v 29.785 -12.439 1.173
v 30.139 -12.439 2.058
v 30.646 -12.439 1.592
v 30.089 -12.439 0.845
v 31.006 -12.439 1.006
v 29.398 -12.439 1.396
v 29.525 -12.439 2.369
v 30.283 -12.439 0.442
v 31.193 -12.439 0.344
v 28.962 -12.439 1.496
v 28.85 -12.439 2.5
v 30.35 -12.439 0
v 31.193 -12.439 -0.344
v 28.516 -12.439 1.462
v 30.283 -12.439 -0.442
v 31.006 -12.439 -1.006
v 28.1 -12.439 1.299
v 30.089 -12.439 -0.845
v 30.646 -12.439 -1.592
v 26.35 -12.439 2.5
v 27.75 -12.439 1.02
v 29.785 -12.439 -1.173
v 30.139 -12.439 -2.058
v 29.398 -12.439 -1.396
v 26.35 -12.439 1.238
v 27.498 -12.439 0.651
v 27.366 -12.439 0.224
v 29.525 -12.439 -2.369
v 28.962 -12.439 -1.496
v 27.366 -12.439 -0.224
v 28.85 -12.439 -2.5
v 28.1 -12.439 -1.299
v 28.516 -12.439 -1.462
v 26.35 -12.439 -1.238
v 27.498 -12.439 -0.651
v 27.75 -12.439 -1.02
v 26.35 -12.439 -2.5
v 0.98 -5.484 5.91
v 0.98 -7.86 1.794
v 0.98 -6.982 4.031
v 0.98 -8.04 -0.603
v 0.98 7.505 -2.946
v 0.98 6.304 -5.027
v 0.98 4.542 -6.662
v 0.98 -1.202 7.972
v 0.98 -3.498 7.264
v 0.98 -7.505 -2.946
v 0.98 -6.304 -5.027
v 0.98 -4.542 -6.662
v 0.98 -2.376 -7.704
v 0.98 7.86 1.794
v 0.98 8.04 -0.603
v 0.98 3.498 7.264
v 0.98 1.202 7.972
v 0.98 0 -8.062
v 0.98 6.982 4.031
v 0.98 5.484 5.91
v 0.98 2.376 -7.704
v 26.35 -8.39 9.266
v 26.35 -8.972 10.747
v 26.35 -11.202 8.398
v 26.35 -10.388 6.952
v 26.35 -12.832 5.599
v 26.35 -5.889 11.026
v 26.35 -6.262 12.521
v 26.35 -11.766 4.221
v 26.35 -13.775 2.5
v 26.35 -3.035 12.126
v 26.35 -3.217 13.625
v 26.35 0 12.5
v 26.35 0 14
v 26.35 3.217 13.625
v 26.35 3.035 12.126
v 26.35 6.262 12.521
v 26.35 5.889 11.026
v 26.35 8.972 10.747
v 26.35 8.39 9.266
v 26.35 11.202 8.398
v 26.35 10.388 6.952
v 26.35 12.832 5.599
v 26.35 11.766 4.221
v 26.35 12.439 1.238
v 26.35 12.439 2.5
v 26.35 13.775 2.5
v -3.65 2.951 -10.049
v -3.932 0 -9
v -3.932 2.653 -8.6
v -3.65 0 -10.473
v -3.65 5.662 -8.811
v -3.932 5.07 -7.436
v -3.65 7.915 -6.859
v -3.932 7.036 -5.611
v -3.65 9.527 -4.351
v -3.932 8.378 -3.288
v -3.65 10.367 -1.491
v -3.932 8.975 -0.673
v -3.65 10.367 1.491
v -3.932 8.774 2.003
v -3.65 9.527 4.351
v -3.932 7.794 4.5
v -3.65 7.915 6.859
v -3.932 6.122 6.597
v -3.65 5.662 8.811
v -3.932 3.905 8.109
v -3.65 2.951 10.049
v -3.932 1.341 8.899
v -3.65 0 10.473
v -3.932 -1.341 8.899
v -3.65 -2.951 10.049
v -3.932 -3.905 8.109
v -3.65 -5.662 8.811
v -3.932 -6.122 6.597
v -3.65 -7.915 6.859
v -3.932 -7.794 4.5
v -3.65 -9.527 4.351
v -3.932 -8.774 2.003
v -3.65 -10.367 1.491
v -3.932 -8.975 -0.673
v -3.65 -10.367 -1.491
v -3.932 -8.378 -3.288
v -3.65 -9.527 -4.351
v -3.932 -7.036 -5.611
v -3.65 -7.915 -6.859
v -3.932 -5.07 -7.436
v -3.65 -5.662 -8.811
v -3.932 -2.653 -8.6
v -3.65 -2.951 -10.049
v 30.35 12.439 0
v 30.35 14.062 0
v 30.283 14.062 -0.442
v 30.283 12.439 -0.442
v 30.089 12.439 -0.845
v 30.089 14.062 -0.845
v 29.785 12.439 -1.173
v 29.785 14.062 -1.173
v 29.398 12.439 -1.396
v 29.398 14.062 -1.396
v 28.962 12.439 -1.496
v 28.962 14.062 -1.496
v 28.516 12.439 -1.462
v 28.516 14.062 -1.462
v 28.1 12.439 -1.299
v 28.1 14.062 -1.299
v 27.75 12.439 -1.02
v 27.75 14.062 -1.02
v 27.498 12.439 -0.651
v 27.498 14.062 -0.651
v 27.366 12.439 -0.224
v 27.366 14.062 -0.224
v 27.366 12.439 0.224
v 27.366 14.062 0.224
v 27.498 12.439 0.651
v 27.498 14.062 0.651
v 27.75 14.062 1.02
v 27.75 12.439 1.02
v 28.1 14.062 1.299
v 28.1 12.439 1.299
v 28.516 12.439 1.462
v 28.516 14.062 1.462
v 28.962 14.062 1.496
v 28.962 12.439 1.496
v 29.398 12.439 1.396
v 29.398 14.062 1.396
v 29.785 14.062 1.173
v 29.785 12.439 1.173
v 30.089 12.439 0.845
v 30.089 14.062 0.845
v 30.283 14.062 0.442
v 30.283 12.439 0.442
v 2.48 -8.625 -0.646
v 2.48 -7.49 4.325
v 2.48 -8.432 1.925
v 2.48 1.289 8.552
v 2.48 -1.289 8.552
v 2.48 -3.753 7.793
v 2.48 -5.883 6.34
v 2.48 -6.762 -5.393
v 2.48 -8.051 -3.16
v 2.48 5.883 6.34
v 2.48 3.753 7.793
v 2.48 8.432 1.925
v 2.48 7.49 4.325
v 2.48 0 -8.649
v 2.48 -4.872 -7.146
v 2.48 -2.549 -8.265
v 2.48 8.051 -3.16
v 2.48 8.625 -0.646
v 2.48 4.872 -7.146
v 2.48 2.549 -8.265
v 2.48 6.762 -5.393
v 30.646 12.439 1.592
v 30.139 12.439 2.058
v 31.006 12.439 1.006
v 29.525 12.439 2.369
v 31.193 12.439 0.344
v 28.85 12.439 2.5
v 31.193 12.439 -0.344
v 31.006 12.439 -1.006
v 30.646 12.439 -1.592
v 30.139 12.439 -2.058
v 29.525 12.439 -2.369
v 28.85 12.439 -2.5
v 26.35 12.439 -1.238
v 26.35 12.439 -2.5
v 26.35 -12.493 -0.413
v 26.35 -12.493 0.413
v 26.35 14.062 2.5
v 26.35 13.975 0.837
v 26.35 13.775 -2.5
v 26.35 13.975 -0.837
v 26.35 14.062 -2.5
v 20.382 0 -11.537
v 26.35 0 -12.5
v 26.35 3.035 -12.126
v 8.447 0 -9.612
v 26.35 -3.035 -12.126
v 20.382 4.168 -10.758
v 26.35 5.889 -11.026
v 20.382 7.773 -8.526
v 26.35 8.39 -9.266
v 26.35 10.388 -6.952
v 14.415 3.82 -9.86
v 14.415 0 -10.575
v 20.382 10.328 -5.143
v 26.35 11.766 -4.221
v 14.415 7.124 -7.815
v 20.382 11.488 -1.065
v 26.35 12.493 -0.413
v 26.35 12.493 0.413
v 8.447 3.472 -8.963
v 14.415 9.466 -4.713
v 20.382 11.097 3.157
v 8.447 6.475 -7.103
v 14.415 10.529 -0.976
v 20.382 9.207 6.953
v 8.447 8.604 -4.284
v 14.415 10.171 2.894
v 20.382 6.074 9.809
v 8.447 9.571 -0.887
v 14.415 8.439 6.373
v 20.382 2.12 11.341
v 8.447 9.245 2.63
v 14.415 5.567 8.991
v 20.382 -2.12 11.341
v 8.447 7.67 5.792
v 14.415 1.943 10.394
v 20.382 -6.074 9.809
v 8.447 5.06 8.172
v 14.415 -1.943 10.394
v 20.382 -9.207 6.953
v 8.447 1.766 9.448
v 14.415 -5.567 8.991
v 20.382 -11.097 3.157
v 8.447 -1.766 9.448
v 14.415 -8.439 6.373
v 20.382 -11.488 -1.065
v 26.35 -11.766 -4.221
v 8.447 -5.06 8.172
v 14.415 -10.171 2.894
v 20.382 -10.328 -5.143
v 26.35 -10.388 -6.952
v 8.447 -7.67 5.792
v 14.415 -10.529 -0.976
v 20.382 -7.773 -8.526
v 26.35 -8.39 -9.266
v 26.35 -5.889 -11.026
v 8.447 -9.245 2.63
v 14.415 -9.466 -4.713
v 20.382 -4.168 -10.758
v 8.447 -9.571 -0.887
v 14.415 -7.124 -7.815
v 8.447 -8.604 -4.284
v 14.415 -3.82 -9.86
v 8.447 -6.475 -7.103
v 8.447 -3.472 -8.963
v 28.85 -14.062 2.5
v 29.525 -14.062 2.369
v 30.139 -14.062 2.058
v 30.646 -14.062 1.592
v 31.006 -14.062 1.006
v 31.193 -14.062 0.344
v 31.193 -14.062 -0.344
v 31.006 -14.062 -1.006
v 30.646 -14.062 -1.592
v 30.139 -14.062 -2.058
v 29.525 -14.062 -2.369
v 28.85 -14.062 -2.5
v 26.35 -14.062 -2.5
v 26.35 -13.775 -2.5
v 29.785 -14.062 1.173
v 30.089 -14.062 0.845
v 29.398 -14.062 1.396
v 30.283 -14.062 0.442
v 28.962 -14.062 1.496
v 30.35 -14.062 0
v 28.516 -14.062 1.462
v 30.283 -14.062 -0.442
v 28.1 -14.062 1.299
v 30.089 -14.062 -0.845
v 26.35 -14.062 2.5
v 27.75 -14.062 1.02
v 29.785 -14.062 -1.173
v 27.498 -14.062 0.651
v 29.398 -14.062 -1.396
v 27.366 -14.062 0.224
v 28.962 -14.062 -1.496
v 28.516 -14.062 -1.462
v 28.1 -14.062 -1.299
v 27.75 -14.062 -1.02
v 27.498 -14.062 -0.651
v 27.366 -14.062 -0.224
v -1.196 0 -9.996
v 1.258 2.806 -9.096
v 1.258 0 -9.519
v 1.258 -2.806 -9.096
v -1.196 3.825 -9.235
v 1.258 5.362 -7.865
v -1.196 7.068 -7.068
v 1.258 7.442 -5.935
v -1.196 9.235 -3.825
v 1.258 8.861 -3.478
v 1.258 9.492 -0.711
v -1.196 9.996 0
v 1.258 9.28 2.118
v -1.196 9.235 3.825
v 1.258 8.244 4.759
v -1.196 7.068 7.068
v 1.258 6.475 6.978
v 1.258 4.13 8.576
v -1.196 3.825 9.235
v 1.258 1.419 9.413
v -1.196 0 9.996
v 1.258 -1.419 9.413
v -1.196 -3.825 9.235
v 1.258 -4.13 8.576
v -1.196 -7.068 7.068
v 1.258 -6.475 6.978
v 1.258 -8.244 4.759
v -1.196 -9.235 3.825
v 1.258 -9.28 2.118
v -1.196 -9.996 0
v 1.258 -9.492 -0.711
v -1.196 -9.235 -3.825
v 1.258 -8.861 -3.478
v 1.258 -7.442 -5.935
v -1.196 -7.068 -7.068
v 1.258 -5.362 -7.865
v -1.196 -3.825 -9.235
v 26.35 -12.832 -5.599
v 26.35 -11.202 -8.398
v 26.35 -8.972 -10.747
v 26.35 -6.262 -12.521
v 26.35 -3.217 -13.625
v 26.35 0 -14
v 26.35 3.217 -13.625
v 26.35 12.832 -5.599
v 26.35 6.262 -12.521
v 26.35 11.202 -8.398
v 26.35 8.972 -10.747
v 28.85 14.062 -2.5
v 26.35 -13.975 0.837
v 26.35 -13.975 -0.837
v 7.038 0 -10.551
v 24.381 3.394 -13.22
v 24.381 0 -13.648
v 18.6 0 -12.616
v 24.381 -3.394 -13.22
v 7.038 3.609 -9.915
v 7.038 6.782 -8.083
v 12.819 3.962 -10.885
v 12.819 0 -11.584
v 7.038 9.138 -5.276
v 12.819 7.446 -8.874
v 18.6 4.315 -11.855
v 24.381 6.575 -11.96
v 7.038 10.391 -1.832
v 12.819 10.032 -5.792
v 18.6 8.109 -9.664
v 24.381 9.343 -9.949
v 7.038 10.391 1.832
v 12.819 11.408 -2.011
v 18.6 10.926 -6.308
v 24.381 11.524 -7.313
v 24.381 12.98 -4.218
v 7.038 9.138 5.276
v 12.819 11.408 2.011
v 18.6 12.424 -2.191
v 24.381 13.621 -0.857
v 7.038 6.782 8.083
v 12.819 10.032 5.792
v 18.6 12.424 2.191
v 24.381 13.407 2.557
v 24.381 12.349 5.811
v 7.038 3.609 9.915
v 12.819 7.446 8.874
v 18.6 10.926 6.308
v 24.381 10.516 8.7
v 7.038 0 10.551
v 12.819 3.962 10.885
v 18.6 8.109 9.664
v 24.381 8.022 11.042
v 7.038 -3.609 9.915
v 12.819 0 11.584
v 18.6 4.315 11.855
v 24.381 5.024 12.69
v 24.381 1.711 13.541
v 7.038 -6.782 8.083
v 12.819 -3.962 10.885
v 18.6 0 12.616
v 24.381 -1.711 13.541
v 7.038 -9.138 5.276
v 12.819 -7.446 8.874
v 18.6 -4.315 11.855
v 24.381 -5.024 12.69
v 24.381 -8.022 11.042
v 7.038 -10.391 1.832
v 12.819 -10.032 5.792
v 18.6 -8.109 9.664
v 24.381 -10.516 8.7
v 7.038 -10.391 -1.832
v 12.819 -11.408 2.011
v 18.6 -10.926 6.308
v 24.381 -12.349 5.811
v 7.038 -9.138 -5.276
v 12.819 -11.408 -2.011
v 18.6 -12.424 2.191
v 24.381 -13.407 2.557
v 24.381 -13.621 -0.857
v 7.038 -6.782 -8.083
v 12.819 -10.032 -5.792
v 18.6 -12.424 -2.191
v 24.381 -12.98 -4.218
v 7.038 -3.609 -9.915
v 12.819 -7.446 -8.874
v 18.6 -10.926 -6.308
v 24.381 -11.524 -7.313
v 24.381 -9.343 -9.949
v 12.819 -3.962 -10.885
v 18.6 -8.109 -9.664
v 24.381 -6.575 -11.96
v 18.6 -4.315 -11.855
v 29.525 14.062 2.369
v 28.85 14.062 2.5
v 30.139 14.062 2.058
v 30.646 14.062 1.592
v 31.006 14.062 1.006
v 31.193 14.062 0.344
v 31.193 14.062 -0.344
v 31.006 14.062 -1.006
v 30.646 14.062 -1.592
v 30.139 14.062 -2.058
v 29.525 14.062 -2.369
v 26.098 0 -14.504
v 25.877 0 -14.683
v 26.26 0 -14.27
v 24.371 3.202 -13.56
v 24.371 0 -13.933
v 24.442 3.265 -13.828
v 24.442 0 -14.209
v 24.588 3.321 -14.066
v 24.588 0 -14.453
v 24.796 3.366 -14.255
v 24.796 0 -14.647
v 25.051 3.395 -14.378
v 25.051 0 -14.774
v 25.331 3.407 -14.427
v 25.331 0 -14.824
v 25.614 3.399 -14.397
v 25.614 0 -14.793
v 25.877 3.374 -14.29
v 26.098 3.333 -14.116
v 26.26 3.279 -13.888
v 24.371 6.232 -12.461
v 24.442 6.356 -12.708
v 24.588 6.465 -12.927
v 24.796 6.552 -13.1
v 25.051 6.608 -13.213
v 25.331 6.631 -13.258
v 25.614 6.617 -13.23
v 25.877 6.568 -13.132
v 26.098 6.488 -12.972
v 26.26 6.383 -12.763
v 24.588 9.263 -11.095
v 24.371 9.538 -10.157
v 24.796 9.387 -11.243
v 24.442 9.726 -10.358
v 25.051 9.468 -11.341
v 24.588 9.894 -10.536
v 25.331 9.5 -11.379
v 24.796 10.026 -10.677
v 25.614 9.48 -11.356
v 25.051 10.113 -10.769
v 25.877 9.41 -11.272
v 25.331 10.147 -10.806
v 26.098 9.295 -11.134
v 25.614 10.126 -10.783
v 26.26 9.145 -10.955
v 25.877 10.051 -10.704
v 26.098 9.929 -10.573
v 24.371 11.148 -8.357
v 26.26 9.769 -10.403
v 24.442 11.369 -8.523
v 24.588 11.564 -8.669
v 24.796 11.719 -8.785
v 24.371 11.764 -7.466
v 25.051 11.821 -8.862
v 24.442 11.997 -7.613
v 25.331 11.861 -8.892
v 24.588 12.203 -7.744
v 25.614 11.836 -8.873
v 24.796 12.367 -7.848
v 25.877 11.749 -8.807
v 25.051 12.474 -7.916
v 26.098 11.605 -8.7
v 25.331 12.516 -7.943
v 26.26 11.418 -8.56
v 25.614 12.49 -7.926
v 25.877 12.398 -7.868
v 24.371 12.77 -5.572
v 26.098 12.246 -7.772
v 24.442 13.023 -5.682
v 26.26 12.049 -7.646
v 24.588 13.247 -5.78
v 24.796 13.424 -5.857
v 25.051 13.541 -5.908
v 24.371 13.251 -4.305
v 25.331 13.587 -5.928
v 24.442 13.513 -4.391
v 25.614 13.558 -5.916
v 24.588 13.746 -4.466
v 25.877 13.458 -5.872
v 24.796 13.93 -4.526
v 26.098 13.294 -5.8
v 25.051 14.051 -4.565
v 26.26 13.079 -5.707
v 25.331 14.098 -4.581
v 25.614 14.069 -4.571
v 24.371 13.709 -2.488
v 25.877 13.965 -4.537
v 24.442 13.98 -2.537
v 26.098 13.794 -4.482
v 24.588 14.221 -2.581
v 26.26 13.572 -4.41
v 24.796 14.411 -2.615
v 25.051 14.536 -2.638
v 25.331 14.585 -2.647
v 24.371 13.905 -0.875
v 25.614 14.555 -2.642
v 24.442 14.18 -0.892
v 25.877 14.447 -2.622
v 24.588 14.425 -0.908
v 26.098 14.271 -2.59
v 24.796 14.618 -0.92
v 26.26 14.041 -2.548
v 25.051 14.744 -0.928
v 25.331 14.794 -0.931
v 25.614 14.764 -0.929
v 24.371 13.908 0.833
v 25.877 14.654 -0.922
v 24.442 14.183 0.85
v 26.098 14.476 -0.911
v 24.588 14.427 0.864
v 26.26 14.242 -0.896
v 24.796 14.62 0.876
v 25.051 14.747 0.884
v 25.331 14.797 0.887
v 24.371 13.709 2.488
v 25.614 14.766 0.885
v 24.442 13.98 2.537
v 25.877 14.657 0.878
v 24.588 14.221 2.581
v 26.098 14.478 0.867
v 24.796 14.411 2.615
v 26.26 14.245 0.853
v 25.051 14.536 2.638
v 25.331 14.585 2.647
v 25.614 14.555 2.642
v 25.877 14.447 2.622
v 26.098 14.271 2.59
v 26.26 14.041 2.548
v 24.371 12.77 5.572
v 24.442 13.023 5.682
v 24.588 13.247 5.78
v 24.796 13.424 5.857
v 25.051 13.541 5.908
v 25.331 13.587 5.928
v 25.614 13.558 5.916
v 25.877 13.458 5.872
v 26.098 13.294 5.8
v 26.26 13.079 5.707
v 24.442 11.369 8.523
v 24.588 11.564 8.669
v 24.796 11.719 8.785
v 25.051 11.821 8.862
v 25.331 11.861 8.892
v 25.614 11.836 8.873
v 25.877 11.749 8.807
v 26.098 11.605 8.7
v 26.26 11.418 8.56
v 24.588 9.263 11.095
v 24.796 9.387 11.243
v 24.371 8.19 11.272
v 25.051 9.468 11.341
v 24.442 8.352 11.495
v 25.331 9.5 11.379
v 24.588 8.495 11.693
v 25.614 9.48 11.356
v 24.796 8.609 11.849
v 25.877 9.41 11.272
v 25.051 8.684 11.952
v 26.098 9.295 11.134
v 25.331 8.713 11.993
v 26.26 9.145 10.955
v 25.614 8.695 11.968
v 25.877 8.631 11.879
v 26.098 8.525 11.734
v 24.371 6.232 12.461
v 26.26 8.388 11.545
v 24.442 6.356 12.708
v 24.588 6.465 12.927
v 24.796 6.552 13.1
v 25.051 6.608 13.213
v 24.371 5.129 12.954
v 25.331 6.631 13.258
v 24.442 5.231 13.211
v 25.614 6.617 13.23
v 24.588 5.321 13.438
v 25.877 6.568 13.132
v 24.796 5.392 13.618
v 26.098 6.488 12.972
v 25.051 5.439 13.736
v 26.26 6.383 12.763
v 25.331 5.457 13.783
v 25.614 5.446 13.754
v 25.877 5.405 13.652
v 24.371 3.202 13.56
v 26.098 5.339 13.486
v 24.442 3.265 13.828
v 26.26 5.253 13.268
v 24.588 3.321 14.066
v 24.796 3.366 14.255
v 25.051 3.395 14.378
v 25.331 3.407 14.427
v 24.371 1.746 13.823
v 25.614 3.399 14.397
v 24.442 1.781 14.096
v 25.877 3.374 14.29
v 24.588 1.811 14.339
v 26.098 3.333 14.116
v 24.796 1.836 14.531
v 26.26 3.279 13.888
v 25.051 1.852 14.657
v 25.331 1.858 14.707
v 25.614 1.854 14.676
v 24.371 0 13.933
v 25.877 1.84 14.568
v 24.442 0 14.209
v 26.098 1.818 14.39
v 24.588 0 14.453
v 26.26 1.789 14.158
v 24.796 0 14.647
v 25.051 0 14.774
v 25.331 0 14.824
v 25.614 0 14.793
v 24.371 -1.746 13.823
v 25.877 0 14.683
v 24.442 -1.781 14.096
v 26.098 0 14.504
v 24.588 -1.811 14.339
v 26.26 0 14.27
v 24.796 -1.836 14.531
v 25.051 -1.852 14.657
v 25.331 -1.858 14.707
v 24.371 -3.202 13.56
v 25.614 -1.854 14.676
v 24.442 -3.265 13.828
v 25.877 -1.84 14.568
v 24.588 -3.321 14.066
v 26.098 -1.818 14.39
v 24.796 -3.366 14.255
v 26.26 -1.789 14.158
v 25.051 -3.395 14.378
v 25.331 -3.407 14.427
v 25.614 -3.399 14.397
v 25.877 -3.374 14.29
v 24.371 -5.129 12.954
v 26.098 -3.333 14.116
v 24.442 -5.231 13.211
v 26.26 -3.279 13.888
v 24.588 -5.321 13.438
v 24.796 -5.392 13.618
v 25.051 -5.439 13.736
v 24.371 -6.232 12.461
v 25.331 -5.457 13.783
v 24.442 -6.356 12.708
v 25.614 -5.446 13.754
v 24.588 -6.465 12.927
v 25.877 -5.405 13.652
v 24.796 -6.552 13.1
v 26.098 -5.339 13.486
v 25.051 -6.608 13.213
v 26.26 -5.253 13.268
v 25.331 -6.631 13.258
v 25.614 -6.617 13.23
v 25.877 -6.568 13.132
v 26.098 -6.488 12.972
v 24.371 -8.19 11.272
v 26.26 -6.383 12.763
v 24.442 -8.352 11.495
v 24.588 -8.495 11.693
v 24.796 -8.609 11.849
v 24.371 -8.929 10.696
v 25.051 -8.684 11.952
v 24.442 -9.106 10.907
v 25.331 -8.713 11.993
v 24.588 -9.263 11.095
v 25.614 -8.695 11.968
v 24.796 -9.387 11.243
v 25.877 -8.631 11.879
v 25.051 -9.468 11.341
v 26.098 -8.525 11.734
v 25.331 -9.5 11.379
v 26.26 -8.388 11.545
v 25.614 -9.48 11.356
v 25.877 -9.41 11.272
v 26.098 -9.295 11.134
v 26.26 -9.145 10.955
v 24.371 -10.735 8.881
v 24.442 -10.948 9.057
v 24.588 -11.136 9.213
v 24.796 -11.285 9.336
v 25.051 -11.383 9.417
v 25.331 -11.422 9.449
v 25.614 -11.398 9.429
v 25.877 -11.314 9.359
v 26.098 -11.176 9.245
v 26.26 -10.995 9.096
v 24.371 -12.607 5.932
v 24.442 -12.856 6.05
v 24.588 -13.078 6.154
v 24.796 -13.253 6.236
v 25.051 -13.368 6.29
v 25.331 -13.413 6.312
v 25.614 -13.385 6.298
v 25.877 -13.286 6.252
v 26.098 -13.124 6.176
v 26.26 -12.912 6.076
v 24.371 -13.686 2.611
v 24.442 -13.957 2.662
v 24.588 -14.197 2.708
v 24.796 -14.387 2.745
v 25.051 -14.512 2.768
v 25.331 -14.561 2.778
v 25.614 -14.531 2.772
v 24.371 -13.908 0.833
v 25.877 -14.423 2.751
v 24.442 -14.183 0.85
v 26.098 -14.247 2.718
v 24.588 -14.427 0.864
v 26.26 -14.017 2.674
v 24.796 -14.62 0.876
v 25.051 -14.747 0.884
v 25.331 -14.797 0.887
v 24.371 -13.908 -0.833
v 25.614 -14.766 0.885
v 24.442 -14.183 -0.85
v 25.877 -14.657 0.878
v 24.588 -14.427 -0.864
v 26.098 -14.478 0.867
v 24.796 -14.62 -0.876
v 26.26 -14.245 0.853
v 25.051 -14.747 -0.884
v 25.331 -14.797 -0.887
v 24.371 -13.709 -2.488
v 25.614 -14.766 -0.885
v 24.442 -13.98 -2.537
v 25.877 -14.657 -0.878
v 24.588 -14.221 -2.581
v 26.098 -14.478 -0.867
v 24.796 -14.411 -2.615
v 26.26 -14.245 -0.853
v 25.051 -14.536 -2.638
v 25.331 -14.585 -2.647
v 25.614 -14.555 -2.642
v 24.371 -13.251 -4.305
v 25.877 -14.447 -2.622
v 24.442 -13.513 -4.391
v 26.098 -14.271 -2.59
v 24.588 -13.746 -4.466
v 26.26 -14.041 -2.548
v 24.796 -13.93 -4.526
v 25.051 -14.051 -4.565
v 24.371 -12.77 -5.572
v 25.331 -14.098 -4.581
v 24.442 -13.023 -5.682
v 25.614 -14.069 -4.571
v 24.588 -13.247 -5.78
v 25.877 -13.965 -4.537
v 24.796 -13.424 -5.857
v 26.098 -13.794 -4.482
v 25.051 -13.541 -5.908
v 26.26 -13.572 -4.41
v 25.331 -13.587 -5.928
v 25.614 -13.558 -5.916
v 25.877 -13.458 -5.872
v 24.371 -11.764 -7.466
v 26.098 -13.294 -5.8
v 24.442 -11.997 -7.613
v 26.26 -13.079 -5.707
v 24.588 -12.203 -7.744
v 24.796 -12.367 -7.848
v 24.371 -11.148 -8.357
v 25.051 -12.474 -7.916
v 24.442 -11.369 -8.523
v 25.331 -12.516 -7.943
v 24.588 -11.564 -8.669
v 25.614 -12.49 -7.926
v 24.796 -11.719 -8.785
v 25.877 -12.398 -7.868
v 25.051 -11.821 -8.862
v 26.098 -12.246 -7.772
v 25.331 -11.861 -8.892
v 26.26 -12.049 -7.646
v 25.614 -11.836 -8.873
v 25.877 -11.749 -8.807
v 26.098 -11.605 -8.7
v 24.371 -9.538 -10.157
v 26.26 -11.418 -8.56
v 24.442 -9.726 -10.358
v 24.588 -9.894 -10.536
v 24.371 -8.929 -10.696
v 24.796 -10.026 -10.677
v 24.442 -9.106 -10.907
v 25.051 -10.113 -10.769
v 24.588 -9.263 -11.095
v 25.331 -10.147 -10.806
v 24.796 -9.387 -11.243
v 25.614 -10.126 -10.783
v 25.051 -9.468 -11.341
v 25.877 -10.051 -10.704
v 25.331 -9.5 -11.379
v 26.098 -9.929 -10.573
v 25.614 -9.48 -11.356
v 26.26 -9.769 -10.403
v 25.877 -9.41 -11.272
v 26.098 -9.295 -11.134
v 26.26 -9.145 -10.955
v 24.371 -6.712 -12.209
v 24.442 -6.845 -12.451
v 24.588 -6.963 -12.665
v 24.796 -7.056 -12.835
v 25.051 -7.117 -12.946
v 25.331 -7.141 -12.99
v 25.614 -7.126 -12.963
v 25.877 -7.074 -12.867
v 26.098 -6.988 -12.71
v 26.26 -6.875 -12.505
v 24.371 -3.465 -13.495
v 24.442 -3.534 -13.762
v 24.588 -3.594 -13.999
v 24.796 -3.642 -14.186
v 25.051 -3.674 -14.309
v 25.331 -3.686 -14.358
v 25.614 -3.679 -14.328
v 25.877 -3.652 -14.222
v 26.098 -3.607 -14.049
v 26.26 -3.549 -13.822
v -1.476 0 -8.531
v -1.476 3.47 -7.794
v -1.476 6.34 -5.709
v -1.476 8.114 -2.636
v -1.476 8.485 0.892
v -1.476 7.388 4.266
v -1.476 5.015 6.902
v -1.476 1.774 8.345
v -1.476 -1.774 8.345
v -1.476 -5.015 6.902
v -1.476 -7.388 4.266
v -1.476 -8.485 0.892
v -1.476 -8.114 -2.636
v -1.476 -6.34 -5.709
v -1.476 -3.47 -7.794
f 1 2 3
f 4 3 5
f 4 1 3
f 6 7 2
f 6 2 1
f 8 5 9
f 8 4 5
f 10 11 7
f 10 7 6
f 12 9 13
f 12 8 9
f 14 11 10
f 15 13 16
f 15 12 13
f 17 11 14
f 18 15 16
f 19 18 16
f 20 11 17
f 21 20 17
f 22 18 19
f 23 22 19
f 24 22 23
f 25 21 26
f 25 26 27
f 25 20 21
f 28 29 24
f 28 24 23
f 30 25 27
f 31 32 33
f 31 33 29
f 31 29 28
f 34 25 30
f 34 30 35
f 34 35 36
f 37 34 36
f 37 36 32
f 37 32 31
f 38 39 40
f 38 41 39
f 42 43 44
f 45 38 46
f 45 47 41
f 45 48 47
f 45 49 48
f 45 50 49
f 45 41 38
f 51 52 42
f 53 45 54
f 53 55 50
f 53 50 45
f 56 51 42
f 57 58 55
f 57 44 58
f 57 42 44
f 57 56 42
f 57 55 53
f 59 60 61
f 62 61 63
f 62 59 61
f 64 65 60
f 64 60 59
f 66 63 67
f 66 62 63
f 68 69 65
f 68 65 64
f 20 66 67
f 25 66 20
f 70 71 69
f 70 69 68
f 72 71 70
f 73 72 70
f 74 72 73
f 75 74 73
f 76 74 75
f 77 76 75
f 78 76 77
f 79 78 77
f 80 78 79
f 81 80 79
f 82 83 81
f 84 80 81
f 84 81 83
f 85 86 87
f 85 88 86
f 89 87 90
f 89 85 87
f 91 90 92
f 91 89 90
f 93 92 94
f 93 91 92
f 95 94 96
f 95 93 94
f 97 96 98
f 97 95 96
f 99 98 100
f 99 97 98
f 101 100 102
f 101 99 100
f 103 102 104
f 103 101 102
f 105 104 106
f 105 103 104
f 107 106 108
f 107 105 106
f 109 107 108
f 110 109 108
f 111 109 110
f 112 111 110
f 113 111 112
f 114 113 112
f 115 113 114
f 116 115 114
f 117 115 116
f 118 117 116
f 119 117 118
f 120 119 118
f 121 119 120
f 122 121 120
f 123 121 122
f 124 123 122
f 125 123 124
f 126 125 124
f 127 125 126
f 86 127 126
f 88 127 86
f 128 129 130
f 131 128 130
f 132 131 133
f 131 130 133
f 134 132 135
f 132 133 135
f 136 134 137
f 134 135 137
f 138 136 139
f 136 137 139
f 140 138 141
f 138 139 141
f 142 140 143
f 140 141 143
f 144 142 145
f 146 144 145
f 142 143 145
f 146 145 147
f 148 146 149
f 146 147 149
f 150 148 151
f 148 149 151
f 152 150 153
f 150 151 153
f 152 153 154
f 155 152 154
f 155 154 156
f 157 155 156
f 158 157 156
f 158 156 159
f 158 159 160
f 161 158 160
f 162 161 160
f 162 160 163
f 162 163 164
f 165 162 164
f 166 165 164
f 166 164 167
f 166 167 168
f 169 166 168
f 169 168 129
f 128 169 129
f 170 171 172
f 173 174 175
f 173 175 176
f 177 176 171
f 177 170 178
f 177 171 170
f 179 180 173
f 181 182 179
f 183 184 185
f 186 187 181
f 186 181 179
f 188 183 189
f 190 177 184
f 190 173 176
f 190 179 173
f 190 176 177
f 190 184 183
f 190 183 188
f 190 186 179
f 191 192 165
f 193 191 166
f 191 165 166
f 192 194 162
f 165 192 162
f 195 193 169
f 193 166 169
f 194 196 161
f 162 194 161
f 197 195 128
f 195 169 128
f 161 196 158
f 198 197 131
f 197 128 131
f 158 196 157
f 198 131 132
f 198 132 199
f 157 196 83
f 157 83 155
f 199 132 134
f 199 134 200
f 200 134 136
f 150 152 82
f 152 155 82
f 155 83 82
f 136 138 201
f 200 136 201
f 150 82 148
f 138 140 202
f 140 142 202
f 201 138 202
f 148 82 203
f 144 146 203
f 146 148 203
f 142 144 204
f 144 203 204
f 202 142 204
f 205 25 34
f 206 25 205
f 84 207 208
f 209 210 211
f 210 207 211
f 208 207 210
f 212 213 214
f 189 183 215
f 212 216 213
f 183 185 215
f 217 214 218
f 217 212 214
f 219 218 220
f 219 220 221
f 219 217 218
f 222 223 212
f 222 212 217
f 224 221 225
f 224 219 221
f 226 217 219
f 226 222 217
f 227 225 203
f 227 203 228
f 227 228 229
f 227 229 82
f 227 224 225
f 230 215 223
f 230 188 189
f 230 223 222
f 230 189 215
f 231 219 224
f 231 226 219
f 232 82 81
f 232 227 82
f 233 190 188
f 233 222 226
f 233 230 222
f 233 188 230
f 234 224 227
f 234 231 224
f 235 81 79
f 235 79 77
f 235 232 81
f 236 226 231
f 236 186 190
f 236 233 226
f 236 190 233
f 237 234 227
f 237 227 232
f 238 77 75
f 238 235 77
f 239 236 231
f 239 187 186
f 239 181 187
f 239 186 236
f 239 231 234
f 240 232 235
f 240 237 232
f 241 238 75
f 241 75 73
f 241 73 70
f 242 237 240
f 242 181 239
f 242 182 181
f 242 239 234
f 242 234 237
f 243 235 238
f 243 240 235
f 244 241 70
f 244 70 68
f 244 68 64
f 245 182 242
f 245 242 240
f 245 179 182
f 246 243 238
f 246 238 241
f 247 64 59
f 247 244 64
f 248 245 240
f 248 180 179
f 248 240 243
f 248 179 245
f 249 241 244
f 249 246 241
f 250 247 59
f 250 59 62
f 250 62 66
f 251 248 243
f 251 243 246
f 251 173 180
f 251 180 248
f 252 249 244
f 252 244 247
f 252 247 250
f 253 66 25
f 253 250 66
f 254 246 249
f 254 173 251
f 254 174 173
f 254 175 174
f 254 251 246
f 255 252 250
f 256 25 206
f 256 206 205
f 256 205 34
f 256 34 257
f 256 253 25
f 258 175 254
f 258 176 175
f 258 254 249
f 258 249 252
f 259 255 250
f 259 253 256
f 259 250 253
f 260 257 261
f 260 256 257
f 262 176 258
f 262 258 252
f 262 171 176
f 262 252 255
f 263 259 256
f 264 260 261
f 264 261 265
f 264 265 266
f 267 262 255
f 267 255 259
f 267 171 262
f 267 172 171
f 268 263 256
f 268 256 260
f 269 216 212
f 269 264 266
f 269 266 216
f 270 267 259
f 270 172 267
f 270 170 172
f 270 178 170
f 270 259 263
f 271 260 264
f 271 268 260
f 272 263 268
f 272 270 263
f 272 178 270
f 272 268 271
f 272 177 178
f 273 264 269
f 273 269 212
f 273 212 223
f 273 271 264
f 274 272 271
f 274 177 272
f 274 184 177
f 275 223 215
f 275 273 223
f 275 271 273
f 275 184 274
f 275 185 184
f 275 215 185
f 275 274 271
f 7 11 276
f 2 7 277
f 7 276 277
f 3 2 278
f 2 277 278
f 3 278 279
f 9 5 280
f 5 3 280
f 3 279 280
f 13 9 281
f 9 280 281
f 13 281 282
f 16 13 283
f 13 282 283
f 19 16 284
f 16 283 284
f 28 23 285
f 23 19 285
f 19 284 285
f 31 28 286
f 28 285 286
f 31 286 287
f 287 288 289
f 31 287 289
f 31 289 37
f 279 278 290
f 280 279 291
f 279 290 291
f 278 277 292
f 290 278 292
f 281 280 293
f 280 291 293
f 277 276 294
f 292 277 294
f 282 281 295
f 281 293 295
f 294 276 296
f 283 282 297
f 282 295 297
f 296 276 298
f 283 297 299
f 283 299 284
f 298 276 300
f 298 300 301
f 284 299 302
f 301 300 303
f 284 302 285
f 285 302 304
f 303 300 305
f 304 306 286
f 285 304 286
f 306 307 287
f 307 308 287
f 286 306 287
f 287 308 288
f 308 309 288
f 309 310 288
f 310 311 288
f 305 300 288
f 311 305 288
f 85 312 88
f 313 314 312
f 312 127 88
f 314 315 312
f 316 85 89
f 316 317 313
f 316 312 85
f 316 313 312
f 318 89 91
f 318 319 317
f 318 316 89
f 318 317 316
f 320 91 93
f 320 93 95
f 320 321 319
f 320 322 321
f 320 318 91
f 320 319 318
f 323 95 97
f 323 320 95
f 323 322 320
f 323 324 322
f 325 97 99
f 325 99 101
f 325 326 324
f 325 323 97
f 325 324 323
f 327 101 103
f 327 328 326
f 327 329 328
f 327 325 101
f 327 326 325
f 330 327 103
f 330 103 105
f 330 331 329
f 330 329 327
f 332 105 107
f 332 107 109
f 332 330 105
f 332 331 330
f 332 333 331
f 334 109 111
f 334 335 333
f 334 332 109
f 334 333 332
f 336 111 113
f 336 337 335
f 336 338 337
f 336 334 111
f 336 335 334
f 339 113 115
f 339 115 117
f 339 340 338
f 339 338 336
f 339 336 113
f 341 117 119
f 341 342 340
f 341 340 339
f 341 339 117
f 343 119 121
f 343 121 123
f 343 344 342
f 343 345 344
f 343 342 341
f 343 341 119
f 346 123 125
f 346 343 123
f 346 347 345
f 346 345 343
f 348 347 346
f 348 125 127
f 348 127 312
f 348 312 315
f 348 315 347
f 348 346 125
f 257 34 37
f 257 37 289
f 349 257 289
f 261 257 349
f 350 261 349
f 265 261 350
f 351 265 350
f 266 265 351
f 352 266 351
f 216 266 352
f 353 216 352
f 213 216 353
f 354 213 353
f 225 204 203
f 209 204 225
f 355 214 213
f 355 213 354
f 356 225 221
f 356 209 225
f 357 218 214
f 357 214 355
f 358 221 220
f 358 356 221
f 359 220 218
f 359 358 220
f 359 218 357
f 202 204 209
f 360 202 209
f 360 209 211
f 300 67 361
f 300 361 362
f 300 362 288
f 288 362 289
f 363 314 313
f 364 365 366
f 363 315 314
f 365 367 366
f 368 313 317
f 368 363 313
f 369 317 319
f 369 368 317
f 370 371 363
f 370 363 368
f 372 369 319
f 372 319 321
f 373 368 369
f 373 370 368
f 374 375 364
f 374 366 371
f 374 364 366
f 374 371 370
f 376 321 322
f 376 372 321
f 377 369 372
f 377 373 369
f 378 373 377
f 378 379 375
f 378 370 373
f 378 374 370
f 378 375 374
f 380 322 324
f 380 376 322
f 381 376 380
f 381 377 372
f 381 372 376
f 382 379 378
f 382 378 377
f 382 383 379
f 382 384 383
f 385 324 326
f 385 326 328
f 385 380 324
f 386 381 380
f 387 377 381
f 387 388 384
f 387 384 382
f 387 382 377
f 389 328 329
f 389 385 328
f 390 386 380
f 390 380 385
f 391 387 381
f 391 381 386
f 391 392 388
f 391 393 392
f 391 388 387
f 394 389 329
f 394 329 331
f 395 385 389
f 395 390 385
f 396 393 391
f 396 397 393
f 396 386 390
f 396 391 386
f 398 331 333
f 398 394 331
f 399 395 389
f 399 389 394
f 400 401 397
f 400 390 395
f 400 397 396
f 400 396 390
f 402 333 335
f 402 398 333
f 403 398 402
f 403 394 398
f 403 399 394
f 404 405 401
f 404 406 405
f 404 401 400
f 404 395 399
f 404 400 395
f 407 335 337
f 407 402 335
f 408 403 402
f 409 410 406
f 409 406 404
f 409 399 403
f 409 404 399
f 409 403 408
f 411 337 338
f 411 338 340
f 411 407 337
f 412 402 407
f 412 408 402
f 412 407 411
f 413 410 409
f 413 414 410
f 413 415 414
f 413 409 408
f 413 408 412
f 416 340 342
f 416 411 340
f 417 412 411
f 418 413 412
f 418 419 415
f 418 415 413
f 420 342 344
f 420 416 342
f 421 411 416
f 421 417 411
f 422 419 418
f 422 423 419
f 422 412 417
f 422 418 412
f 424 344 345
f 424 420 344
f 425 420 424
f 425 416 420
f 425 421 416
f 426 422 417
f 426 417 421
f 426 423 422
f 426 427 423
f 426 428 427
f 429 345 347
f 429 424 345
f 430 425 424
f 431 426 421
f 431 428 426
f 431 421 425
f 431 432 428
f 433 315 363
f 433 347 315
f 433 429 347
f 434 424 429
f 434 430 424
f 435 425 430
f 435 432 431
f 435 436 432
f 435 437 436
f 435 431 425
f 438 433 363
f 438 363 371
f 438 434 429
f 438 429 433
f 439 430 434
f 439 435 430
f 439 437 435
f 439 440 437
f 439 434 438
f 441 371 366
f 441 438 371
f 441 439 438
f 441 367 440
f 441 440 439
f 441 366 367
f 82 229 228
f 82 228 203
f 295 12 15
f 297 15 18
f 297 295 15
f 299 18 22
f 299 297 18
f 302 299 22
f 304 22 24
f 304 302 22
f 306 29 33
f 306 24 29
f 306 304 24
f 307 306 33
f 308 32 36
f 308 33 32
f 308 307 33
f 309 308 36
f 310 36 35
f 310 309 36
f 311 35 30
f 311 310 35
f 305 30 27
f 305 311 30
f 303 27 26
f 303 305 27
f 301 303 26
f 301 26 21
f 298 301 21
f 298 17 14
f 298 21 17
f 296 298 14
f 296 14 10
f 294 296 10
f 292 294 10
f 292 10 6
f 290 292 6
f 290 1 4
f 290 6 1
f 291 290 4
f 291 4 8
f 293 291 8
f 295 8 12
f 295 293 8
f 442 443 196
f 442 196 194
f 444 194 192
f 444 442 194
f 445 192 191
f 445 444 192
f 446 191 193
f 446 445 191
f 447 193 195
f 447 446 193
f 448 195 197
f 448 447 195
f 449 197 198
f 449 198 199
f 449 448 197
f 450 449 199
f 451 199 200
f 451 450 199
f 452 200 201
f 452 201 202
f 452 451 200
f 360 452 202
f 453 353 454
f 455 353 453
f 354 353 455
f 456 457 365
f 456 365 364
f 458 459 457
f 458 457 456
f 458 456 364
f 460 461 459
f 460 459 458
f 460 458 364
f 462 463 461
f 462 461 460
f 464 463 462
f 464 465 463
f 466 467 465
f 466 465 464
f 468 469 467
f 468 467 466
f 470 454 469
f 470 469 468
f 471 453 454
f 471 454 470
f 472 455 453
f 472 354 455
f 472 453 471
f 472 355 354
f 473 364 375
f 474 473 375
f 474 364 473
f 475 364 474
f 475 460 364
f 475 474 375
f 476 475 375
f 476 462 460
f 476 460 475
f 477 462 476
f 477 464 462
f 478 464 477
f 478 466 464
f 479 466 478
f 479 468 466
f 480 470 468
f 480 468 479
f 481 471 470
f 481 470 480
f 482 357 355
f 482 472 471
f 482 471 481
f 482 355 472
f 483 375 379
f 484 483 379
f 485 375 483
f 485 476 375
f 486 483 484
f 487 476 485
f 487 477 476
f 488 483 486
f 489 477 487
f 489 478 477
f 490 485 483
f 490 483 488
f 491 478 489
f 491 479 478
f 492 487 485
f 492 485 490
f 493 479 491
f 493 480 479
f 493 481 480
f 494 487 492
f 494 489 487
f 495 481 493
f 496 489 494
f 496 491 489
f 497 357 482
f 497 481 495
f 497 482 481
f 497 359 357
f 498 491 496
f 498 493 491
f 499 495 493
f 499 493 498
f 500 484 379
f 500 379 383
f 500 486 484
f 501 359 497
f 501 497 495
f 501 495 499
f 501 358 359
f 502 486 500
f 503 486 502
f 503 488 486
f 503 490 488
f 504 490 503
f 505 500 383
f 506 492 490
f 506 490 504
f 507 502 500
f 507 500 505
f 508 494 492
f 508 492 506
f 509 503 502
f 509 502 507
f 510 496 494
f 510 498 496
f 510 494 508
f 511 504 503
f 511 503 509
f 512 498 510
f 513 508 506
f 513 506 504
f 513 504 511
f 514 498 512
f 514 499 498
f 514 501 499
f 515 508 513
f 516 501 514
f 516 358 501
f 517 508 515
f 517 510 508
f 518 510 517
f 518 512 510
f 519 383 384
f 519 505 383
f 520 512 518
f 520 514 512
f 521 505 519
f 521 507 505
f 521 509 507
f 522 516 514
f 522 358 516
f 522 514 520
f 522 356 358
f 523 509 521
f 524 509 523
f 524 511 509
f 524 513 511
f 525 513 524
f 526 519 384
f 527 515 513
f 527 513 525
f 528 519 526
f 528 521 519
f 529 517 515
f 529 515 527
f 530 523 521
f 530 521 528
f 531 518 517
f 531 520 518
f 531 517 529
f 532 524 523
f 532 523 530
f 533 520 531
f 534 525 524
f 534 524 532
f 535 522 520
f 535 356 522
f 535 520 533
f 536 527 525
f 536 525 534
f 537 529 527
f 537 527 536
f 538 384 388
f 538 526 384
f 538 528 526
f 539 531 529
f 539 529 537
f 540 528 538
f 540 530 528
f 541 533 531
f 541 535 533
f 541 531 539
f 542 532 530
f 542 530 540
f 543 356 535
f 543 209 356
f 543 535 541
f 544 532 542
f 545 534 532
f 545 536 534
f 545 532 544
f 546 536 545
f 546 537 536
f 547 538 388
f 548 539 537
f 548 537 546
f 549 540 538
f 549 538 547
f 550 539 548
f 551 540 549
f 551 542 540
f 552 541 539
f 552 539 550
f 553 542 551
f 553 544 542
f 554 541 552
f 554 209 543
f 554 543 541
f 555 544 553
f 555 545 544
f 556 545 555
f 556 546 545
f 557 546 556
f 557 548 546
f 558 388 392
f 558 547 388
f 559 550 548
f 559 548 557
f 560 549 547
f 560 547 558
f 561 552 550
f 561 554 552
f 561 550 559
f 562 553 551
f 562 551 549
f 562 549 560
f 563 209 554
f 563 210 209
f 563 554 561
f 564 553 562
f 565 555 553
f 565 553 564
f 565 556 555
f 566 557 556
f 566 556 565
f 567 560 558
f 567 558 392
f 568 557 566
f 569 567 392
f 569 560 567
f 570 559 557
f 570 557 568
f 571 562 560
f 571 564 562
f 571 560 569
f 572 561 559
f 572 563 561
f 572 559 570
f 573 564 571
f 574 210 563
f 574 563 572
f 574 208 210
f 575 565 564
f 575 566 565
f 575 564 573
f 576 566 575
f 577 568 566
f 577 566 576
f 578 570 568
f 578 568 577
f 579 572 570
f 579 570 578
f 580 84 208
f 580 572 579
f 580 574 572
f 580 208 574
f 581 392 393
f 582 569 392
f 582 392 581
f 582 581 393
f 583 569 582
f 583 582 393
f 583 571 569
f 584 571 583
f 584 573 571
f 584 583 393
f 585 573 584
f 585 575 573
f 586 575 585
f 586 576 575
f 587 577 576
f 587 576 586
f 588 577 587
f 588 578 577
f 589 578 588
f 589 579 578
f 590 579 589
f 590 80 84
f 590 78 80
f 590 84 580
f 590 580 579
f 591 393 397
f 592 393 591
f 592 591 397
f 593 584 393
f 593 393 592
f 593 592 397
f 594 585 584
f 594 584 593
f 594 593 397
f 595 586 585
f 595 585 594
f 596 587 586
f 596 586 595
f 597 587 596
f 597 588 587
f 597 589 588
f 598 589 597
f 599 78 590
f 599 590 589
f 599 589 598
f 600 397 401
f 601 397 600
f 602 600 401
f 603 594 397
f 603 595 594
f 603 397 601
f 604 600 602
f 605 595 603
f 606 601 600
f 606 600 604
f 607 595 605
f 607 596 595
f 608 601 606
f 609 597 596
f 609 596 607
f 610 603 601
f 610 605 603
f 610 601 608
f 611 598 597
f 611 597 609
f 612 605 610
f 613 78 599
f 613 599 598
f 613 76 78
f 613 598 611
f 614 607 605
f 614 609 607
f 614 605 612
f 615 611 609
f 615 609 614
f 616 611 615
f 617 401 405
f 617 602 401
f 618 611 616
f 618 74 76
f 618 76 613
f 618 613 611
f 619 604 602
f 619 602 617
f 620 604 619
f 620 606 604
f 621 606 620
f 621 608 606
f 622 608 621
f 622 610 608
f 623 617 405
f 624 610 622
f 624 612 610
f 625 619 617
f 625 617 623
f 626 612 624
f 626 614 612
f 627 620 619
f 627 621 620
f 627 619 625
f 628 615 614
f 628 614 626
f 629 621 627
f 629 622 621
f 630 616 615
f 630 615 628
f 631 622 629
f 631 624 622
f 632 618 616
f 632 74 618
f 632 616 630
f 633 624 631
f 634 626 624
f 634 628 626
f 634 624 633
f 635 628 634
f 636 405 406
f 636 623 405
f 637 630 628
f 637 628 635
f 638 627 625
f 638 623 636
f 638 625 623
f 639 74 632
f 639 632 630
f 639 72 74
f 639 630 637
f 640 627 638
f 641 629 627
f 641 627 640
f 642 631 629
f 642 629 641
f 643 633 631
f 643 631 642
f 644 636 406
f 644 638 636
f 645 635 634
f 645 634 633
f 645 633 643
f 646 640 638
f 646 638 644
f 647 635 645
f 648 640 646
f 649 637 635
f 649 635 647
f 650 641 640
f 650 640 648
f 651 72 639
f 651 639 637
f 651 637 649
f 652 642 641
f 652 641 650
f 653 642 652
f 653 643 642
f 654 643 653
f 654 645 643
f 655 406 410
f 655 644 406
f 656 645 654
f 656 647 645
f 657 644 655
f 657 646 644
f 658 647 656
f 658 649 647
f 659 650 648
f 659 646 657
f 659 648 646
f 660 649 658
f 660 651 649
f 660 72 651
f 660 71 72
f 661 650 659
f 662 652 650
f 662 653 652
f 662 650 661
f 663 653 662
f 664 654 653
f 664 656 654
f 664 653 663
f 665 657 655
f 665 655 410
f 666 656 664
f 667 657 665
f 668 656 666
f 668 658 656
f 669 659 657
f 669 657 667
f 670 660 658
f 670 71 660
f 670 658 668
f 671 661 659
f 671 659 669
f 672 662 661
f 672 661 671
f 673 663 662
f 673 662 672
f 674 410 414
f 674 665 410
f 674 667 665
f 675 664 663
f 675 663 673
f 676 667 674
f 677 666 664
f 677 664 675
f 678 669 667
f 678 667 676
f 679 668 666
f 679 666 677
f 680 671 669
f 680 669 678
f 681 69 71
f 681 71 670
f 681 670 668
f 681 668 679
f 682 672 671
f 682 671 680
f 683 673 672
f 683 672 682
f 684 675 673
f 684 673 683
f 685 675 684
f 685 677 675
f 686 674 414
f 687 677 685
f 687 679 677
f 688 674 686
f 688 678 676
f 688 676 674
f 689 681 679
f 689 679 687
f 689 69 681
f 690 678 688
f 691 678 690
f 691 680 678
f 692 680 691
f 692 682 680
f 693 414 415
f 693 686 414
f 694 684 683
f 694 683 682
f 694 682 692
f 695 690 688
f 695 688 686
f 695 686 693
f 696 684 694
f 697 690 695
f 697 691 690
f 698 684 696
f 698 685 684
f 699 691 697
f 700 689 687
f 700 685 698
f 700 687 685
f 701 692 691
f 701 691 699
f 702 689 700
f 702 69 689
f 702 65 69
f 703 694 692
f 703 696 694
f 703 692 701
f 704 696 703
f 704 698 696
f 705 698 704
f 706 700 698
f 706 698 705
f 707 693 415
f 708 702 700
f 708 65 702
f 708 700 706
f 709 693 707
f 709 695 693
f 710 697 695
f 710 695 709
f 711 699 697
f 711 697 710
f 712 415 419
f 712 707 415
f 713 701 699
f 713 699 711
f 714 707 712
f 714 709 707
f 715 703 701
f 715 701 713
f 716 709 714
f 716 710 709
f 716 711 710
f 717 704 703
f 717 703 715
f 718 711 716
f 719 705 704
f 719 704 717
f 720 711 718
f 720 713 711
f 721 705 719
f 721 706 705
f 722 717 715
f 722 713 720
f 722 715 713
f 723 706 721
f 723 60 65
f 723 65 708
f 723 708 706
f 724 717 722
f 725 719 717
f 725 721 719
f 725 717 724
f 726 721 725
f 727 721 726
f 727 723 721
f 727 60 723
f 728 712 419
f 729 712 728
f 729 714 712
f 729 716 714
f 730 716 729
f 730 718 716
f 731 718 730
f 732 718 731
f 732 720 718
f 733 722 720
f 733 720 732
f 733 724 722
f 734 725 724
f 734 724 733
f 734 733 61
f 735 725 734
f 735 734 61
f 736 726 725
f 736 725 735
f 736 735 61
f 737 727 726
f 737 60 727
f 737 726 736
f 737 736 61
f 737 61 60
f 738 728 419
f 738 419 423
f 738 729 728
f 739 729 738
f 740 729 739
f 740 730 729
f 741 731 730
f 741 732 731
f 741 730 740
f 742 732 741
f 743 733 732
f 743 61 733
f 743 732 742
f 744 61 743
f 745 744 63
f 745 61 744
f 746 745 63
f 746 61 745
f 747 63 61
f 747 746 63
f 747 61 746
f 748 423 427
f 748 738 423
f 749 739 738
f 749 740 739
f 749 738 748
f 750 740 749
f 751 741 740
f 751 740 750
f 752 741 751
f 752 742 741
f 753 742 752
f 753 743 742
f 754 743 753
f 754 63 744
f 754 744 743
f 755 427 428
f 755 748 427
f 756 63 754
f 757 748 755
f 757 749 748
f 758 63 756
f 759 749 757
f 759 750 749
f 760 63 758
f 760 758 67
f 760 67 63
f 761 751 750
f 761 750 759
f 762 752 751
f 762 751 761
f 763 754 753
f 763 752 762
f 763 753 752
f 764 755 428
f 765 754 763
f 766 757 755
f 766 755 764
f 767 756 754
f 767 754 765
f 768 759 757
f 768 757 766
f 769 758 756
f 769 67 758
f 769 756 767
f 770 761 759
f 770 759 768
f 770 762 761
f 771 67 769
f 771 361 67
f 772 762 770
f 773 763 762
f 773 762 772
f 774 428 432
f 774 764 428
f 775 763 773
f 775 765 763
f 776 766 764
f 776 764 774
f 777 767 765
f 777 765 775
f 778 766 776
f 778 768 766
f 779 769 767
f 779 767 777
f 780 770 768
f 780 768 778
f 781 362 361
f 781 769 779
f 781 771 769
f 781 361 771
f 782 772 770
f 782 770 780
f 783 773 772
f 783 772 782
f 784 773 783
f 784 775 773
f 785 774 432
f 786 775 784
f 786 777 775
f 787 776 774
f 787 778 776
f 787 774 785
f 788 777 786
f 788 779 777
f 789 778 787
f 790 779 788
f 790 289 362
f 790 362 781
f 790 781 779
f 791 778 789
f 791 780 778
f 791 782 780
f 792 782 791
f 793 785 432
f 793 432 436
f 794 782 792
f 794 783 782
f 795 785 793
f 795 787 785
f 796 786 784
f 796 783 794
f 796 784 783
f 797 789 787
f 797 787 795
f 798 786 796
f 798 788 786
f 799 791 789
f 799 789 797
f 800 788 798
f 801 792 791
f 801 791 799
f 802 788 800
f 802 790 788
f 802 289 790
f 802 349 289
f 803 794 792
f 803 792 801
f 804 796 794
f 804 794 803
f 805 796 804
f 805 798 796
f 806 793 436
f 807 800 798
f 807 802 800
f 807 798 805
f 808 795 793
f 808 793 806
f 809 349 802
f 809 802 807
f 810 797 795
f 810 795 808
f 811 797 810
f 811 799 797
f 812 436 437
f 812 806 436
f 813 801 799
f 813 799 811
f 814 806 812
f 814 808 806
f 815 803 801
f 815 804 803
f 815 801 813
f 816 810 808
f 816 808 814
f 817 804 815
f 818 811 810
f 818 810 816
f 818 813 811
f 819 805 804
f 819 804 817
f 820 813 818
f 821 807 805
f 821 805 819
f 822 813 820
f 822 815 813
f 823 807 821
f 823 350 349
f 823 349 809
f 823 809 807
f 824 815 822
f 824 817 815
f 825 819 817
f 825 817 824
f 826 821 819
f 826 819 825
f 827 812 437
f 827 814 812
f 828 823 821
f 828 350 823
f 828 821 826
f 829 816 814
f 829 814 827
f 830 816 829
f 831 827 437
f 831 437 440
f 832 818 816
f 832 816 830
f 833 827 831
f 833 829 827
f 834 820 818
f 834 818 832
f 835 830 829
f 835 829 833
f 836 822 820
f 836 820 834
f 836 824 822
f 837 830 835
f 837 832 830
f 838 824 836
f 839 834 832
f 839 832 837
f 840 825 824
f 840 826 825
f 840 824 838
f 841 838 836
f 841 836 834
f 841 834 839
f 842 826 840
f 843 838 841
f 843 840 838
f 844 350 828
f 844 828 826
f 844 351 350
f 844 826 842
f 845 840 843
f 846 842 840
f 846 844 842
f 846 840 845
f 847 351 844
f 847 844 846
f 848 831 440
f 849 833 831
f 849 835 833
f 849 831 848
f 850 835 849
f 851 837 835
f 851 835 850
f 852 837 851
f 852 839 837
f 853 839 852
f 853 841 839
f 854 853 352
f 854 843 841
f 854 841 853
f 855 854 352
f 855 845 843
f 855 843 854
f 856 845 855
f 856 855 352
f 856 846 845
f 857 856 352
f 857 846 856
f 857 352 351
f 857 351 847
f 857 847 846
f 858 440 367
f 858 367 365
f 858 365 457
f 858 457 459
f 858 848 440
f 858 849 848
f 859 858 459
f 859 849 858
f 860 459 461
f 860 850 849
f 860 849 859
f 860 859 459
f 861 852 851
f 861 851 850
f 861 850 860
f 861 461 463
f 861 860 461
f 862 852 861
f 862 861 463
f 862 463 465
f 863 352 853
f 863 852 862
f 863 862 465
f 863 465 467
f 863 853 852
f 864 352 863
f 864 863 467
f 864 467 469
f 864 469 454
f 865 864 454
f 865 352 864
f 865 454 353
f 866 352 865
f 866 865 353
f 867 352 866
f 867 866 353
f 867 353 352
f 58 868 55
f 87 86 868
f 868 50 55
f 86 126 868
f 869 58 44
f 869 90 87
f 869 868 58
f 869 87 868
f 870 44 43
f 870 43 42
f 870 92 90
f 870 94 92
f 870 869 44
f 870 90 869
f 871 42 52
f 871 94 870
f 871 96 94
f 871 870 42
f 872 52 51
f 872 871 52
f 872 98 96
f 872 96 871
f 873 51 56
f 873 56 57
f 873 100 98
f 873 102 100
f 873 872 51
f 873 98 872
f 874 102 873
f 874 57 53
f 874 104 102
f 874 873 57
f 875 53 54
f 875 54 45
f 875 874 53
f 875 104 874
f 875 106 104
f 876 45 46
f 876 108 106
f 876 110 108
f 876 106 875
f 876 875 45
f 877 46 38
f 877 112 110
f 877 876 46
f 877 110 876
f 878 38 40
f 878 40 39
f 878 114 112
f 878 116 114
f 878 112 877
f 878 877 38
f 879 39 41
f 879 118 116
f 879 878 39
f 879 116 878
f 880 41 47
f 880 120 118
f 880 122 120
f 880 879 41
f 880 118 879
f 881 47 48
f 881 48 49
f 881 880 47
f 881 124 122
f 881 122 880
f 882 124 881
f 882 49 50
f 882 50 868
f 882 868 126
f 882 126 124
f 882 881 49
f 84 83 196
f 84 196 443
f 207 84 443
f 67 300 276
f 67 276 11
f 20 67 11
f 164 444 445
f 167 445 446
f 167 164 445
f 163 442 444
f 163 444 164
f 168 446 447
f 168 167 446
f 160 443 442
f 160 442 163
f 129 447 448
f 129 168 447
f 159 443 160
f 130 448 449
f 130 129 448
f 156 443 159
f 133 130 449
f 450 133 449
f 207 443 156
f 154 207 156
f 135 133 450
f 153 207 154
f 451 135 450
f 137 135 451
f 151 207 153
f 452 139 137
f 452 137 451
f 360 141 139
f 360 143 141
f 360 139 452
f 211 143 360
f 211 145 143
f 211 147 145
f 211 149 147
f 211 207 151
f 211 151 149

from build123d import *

# Parameters (mm, degrees)
SKETCH2_W           = 5
SKETCH2_H           = 1.623250271
BOSS_EXTRUDE1_DEPTH = 5
CUT_EXTRUDE1_DEPTH  = 26.500274
SKETCH4_R           = 1.5
CUT_EXTRUDE2_DEPTH  = 26.500274


with BuildPart() as part:
    # Sketch1 → Revolve1 (revolve)
    with BuildSketch(Plane(origin=(0, 0, 0), x_dir=(1, 0, 0), z_dir=(0, 1, 0))):
        with BuildLine():
            Line((1.257722515, 9.518975428), (24.380809012, 13.648394277))
            ThreePointArc((24.380809012, 13.648394277), (25.189431543, 14.808622531), (26.349659797, 14))
            Line((26.349659797, 14), (26.349659797, 12.5))
            Line((26.349659797, 12.5), (2.479732811, 8.649095646))
            Line((2.479732811, 8.649095646), (2.479732811, 0))
            Line((2.479732811, 0), (0.979732811, 0))
            Line((0.979732811, 0), (0.979732811, 8.0625))
            Line((0.979732811, 8.0625), (-3.931590203, 9))
            Line((-3.931590203, 9), (-3.650340203, 10.473396904))
            Line((-3.650340203, 10.473396904), (1.257722515, 9.518975428))
        make_face()
    revolve(axis=Axis((-20.81402906, 0, 0), (1, 0, 0)))

    # Sketch2 → Boss-Extrude1 (add)
    with BuildSketch(Plane(origin=(26.349659797, 0, 0), x_dir=(0, 0, -1), z_dir=(1, 0, 0))):
        with Locations((0, 13.250136984)):
            Rectangle(SKETCH2_W, SKETCH2_H)
        with Locations((0, -13.250136984)):
            Rectangle(SKETCH2_W, SKETCH2_H)
    extrude(amount=BOSS_EXTRUDE1_DEPTH)

    # Sketch3 → Cut-Extrude1 (cut)
    with BuildSketch(Plane(origin=(0, 14.061762119, 0), x_dir=(1, 0, 0), z_dir=(0, 1, 0))):
        with BuildLine():
            Line((28.849659797, 2.5), (31.349659797, 2.5))
            Line((31.349659797, 2.5), (31.349659797, -2.5))
            Line((31.349659797, -2.5), (28.849659797, -2.5))
            ThreePointArc((28.849659797, -2.5), (31.217194374, 0), (28.849659797, 2.5))
        make_face()
    cut_extrude1 = extrude(amount=-CUT_EXTRUDE1_DEPTH, mode=Mode.SUBTRACT)

    # Mirror1: Cut-Extrude1 across plane
    add(cut_extrude1.mirror(Plane.ZX), mode=Mode.SUBTRACT)

    # Sketch4 → Cut-Extrude2 (cut)
    with BuildSketch(Plane(origin=(0, 14.061762119, 0), x_dir=(1, 0, 0), z_dir=(0, 1, 0))):
        with Locations((28.849659797, 0)):
            Circle(SKETCH4_R)
    cut_extrude2 = extrude(amount=-CUT_EXTRUDE2_DEPTH, mode=Mode.SUBTRACT)

    # Mirror2: Cut-Extrude2 across plane
    add(cut_extrude2.mirror(Plane.ZX), mode=Mode.SUBTRACT)


solid = part.part
